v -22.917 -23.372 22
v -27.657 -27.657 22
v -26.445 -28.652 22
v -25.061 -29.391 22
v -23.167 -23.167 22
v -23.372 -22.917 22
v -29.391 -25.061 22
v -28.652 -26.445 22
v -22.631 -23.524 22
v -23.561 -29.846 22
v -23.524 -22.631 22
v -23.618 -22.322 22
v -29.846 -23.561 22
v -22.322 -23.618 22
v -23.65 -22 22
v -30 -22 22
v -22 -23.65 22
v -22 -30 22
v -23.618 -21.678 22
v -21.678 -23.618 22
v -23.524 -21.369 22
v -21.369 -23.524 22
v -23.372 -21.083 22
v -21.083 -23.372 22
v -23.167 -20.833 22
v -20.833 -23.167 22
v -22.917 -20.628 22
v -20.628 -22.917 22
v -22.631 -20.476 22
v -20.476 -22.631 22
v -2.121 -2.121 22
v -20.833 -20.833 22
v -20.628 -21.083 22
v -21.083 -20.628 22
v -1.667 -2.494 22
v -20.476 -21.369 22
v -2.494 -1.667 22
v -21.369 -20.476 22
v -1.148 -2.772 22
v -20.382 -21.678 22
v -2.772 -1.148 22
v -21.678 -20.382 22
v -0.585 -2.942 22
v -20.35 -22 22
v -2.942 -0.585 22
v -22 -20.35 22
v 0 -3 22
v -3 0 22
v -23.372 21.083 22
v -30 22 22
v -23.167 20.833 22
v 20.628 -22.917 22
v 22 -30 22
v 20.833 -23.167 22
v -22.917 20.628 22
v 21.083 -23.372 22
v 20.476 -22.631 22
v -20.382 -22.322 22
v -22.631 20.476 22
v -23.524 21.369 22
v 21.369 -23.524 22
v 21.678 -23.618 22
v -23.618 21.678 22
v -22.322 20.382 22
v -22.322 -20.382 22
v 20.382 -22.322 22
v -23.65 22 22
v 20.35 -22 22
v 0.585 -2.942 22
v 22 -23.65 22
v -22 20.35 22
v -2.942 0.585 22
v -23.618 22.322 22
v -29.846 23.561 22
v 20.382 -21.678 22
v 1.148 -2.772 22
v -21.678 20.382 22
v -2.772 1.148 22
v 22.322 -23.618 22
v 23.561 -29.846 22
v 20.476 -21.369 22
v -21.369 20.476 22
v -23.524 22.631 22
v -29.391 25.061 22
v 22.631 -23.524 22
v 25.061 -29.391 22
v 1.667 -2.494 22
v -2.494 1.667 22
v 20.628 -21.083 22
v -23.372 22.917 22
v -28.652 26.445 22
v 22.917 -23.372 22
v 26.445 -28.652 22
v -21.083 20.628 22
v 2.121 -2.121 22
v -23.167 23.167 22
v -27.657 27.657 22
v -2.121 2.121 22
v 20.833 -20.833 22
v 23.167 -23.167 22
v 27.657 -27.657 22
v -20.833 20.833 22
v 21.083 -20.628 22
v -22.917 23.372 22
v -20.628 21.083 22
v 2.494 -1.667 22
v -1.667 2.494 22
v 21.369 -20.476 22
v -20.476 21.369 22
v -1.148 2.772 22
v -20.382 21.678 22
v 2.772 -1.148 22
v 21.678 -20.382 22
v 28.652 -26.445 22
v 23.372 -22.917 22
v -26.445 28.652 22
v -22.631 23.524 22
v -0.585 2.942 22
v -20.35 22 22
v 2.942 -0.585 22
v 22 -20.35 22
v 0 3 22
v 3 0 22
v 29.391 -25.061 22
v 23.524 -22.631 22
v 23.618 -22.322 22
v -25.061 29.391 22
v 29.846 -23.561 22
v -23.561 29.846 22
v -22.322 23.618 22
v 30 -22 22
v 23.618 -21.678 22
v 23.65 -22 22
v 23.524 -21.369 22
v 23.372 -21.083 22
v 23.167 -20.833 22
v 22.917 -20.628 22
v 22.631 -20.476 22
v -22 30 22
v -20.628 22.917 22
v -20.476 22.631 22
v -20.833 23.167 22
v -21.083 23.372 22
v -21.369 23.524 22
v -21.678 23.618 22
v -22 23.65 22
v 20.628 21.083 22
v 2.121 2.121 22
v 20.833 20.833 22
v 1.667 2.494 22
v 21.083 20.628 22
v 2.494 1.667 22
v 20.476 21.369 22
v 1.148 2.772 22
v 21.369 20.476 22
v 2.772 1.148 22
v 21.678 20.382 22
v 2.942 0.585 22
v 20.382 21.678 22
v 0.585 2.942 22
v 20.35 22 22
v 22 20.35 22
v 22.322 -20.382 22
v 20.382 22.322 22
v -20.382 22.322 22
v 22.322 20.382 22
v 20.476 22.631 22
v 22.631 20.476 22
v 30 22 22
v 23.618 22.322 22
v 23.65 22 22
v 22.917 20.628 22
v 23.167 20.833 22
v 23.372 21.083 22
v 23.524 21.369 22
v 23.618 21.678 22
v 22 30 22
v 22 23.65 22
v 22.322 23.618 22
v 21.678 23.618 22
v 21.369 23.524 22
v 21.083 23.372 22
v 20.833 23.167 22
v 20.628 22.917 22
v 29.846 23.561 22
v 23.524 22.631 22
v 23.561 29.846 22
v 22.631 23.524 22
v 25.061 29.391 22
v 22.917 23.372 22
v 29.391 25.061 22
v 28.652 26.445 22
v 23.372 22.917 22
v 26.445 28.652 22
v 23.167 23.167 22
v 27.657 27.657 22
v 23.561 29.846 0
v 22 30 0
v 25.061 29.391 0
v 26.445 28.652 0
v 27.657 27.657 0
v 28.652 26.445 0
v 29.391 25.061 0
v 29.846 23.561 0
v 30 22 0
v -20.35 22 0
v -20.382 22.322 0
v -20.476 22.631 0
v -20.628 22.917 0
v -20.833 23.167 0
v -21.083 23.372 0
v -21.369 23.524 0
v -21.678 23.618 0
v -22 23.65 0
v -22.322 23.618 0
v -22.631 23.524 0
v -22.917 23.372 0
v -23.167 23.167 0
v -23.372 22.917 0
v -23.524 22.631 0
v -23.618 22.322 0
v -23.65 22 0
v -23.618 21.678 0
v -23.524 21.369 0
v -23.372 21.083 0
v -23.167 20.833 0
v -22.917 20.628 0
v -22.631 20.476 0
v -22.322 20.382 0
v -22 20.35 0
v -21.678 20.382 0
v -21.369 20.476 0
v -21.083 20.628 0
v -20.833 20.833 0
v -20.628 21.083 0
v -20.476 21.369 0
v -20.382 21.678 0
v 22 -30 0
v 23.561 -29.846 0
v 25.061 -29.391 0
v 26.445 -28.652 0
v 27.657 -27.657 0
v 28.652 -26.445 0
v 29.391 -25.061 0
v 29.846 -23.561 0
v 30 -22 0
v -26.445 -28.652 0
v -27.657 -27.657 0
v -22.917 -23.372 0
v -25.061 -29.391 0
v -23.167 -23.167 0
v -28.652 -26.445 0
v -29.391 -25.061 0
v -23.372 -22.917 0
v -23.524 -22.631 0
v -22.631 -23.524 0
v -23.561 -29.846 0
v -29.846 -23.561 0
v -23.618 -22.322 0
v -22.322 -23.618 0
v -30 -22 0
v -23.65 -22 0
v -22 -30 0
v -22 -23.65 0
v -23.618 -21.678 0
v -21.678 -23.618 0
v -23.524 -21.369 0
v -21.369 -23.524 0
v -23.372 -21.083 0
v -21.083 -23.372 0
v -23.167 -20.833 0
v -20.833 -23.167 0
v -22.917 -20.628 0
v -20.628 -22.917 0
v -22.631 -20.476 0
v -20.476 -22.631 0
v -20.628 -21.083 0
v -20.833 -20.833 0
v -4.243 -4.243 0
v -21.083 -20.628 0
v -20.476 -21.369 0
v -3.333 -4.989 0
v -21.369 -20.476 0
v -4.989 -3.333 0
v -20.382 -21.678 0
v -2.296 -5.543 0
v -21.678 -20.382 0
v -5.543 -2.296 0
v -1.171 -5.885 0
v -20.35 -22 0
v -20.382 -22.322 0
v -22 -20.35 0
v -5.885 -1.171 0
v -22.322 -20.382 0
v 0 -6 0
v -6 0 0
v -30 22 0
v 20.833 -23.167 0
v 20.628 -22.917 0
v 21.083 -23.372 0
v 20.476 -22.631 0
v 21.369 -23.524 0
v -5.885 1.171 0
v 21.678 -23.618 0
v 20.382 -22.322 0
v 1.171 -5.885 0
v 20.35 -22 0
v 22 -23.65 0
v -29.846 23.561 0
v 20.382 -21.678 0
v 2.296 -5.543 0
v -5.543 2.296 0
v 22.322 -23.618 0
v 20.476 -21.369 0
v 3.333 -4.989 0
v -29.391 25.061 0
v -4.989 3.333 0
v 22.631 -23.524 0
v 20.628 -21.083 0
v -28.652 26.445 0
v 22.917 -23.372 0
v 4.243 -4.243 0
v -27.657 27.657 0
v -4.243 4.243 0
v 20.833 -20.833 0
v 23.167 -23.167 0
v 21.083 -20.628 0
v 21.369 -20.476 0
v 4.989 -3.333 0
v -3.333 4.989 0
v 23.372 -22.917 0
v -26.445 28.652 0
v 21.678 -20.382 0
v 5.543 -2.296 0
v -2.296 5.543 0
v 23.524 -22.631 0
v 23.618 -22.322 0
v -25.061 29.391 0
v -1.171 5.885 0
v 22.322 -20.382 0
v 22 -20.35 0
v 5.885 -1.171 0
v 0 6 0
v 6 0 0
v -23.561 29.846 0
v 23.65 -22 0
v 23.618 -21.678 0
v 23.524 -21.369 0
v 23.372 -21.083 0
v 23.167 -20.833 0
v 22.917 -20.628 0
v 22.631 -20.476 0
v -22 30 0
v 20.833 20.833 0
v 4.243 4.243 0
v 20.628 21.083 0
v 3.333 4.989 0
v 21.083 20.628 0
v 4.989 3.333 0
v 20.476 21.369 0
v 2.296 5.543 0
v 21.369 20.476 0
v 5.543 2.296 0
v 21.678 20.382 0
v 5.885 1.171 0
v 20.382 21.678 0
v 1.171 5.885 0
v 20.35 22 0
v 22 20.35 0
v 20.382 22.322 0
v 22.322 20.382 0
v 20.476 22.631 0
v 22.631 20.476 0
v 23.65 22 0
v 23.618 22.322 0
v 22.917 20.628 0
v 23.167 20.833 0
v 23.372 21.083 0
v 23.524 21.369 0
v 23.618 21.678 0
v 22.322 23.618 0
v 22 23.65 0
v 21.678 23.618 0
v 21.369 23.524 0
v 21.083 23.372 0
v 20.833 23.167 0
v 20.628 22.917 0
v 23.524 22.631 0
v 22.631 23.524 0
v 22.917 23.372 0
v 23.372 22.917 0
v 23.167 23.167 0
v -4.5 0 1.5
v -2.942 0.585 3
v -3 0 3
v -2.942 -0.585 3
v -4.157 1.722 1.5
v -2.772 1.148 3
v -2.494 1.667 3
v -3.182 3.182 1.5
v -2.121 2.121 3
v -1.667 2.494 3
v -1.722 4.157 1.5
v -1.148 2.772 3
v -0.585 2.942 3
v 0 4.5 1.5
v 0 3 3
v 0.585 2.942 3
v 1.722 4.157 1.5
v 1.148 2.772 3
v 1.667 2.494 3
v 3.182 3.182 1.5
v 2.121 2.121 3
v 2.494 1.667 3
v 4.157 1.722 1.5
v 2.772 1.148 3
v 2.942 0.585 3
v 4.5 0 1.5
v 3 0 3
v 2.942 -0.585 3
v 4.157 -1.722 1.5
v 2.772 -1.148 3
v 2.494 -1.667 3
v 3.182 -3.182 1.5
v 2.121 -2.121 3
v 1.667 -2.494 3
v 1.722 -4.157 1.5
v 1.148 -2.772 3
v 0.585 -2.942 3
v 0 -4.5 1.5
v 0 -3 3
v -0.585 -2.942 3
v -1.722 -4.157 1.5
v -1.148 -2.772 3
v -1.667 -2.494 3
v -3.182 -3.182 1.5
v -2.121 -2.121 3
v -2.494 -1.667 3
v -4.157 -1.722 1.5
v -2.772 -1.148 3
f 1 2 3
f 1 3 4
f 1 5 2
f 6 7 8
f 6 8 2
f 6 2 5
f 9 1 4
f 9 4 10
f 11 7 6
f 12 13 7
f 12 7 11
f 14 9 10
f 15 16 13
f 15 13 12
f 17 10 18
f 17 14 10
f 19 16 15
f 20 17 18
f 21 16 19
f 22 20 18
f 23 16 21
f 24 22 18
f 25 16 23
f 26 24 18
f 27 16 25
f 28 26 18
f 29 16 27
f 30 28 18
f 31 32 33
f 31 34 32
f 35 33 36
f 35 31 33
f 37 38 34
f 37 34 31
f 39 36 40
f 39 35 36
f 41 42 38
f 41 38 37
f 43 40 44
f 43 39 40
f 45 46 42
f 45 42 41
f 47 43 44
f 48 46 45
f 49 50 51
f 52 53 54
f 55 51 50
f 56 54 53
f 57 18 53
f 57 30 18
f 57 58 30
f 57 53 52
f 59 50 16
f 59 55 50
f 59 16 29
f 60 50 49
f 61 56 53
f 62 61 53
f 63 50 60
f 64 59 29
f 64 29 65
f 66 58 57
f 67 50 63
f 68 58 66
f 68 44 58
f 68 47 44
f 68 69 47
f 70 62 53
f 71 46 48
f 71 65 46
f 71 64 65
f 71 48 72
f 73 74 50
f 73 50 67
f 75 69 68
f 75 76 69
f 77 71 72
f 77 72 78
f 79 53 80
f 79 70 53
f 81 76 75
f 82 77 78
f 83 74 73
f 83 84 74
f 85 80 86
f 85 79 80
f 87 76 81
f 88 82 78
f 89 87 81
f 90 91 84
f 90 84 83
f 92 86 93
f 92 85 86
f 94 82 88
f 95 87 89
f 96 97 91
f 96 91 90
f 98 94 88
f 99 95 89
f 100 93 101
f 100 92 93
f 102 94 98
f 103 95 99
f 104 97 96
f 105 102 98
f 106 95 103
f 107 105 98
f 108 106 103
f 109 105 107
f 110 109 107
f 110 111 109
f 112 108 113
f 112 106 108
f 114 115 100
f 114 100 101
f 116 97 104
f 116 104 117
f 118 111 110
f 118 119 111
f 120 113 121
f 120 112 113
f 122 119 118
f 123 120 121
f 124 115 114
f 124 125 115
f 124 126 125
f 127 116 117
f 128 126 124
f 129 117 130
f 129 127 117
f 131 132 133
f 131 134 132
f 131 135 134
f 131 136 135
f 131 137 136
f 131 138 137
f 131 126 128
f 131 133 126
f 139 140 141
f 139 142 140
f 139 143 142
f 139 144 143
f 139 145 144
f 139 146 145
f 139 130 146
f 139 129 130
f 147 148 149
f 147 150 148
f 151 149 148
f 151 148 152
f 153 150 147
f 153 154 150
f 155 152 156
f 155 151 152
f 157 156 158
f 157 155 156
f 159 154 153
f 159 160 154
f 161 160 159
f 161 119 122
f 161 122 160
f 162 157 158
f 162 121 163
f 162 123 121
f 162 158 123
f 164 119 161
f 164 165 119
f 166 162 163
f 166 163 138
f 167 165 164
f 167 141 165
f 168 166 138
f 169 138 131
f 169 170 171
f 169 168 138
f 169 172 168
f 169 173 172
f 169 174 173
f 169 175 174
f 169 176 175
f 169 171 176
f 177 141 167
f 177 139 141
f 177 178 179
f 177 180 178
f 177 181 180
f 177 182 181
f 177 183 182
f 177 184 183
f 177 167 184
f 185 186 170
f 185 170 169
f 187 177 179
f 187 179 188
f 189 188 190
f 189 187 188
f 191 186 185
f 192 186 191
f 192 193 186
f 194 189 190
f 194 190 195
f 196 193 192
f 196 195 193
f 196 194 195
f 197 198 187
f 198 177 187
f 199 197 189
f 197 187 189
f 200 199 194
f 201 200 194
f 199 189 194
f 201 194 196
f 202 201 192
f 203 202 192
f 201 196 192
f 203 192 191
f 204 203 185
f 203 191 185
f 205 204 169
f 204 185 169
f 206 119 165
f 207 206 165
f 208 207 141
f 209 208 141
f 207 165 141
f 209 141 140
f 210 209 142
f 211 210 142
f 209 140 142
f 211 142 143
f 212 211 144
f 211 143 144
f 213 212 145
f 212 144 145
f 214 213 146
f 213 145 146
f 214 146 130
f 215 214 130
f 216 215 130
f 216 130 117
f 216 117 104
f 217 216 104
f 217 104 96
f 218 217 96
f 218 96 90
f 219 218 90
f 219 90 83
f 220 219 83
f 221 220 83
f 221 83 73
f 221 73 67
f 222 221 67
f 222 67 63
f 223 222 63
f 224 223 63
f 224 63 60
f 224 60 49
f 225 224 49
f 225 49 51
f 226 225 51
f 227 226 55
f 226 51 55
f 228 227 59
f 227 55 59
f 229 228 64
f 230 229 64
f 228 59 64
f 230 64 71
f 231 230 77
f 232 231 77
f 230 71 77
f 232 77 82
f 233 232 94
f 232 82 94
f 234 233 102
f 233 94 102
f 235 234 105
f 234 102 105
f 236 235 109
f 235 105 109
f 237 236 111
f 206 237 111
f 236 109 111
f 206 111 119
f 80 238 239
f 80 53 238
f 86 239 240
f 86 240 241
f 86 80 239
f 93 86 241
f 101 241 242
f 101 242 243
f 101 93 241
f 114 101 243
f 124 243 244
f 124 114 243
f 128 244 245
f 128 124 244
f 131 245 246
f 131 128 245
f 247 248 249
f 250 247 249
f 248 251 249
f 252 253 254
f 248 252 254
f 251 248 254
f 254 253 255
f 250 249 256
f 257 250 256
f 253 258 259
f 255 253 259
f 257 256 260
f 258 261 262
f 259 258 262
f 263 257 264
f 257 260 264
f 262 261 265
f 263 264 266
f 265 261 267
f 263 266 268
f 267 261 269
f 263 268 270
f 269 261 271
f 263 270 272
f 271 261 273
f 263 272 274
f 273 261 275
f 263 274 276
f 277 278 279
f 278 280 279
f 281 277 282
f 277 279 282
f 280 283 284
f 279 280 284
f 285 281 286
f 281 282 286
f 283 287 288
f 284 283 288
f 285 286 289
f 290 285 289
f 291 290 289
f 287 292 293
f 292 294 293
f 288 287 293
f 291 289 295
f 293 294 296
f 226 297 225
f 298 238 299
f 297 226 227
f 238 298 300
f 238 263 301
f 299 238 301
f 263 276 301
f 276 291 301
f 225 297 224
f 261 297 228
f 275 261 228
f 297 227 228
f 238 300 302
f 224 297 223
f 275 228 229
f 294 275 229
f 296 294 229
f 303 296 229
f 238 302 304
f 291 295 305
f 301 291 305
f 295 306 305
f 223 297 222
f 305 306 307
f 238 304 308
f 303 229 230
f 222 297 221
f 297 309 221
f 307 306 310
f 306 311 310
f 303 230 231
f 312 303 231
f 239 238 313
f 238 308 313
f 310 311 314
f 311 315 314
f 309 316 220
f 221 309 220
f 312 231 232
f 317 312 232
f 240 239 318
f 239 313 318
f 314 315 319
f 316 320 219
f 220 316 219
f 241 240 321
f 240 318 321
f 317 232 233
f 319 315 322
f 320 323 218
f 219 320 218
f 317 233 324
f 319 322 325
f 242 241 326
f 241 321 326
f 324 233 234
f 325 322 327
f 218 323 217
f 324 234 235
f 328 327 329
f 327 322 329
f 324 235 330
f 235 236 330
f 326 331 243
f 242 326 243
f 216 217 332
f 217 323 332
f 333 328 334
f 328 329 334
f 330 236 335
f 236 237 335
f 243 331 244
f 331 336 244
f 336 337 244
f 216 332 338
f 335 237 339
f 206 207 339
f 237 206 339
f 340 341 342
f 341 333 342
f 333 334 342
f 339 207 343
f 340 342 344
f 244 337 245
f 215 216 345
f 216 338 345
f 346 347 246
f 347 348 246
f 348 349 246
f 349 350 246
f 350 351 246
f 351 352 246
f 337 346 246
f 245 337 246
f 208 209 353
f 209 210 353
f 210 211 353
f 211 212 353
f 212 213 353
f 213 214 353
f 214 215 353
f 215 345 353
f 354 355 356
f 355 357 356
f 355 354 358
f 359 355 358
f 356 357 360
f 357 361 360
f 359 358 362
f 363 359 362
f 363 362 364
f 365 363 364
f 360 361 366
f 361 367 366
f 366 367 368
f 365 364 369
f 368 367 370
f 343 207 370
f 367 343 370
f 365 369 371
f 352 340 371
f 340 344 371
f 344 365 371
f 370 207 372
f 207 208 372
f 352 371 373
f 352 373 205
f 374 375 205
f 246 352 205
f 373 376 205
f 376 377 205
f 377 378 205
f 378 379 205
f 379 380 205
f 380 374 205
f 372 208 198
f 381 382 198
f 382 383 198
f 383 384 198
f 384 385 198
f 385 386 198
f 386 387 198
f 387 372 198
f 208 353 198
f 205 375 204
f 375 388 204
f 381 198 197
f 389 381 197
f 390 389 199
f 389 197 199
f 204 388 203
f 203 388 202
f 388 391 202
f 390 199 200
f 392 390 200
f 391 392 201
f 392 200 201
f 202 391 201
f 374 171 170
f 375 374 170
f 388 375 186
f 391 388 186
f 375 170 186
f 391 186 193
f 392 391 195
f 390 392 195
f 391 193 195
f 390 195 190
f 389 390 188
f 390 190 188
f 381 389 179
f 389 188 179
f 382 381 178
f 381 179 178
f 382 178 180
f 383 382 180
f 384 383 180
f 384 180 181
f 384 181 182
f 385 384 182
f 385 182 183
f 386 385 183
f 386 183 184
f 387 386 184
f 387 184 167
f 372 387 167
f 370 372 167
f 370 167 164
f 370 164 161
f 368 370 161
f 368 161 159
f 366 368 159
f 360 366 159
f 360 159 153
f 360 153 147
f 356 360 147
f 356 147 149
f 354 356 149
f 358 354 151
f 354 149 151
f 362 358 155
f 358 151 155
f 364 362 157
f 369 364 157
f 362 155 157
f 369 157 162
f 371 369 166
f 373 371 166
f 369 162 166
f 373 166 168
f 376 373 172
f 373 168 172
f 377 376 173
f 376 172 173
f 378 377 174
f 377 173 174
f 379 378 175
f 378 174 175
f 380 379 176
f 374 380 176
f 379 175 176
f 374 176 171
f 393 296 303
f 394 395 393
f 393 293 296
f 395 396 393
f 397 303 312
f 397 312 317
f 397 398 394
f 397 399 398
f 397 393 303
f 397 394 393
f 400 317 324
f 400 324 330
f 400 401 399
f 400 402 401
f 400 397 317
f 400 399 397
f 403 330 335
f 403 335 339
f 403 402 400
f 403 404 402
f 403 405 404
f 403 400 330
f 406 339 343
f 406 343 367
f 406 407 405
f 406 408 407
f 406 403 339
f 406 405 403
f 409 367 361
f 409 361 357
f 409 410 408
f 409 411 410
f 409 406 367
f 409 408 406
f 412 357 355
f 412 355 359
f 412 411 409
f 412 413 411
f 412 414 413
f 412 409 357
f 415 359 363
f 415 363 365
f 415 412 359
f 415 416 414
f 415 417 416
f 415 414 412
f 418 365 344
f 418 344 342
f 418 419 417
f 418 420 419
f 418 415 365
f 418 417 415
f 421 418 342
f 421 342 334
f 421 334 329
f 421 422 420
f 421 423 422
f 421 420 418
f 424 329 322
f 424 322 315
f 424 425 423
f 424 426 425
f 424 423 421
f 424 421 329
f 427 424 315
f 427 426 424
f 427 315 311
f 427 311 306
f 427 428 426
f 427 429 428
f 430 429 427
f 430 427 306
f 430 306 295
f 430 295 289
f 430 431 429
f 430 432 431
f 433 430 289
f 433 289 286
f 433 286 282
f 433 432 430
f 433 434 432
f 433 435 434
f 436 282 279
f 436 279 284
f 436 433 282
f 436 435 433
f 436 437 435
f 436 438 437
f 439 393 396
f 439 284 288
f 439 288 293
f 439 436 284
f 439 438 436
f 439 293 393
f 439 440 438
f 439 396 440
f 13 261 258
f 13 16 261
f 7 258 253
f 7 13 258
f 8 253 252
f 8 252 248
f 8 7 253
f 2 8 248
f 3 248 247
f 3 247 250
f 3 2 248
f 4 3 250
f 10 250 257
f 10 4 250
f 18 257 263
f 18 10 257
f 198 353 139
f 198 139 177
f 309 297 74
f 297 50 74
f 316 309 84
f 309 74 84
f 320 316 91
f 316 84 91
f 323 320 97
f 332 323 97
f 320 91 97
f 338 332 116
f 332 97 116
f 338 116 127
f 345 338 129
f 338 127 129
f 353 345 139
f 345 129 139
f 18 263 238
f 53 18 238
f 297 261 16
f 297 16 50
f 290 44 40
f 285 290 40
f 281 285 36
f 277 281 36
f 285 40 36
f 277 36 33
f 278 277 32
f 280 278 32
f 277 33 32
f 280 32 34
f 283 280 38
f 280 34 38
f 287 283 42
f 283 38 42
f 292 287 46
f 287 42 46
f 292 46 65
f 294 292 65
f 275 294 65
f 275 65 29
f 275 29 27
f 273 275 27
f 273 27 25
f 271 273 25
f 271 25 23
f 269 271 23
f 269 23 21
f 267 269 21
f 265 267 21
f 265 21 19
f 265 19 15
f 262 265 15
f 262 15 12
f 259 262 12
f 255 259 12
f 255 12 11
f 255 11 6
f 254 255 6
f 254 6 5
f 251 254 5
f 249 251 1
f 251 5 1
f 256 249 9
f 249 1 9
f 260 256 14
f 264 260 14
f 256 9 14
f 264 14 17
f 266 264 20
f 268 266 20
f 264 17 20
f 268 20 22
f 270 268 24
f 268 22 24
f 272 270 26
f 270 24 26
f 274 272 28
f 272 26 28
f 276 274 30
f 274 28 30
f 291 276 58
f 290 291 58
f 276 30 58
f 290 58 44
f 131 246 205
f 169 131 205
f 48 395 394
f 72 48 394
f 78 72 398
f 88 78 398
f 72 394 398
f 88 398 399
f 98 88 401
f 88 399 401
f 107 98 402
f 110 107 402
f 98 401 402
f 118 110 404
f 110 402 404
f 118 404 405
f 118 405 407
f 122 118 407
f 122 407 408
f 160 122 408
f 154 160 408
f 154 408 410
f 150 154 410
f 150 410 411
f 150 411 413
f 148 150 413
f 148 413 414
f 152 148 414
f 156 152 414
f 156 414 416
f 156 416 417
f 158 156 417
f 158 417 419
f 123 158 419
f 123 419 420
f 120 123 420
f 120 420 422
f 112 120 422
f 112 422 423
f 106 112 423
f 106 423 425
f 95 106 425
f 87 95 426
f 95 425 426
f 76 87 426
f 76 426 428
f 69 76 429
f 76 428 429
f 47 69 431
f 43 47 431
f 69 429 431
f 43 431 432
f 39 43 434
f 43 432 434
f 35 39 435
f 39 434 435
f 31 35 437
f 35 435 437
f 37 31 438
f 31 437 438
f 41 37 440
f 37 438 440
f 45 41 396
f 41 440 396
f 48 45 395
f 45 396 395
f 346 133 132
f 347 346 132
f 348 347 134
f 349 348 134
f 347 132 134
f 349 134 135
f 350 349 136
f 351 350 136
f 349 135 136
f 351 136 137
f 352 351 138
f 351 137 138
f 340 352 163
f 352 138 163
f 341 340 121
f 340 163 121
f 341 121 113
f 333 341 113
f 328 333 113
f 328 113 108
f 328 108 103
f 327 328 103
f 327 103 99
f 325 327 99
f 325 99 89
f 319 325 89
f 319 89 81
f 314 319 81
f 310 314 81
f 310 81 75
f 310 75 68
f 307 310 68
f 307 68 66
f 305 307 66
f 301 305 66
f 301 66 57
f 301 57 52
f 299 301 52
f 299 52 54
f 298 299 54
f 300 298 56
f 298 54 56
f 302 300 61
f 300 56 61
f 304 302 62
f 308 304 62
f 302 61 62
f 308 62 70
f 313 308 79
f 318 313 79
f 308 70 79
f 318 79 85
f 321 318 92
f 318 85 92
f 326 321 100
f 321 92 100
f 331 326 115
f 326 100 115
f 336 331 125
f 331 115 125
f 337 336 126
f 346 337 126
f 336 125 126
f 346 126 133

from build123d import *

# Parameters (mm, degrees)
SKETCH1_W             = 60
SKETCH1_H             = 60
BOSS_EXTRUDE1_DEPTH   = 22
SKETCH2_R             = 3
CUT_EXTRUDE1_DEPTH    = 23
CHAMFER1_SIZE         = 3
FILLET1_R             = 8
M4X0_7_TAPPED_HOLE1_D = 3.3


with BuildPart() as part:
    # Sketch1 → Boss-Extrude1 (new body)
    with BuildSketch(Plane.XY):
        Rectangle(SKETCH1_W, SKETCH1_H)
    extrude(amount=BOSS_EXTRUDE1_DEPTH)

    # Sketch2 → Cut-Extrude1 (cut, through all)
    with BuildSketch(Plane(origin=(0, 0, 0), x_dir=(-1, 0, 0), z_dir=(0, 0, -1))):
        Circle(SKETCH2_R)
    extrude(amount=-CUT_EXTRUDE1_DEPTH, mode=Mode.SUBTRACT)

    # Chamfer1
    chamfer1_edges = [part.edges().sort_by_distance(p)[0] for p in [
        (3, 0, 0),
    ]]
    chamfer(chamfer1_edges, length=CHAMFER1_SIZE)

    # Fillet1
    fillet1_edges = [part.edges().sort_by_distance(p)[0] for p in [
        (30, -30, 11),
        (-30, -30, 11),
        (-30, 30, 11),
        (30, 30, 11),
    ]]
    fillet(fillet1_edges, radius=FILLET1_R)

    # M4x0.7 Tapped Hole1 (through all)
    with Locations(Plane(origin=(0, 0, 0), x_dir=(-1, 0, 0), z_dir=(0, 0, -1))):
        with Locations((-22, 22), (22, 22), (22, -22), (-22, -22)):
            Hole(M4X0_7_TAPPED_HOLE1_D / 2)


solid = part.part
